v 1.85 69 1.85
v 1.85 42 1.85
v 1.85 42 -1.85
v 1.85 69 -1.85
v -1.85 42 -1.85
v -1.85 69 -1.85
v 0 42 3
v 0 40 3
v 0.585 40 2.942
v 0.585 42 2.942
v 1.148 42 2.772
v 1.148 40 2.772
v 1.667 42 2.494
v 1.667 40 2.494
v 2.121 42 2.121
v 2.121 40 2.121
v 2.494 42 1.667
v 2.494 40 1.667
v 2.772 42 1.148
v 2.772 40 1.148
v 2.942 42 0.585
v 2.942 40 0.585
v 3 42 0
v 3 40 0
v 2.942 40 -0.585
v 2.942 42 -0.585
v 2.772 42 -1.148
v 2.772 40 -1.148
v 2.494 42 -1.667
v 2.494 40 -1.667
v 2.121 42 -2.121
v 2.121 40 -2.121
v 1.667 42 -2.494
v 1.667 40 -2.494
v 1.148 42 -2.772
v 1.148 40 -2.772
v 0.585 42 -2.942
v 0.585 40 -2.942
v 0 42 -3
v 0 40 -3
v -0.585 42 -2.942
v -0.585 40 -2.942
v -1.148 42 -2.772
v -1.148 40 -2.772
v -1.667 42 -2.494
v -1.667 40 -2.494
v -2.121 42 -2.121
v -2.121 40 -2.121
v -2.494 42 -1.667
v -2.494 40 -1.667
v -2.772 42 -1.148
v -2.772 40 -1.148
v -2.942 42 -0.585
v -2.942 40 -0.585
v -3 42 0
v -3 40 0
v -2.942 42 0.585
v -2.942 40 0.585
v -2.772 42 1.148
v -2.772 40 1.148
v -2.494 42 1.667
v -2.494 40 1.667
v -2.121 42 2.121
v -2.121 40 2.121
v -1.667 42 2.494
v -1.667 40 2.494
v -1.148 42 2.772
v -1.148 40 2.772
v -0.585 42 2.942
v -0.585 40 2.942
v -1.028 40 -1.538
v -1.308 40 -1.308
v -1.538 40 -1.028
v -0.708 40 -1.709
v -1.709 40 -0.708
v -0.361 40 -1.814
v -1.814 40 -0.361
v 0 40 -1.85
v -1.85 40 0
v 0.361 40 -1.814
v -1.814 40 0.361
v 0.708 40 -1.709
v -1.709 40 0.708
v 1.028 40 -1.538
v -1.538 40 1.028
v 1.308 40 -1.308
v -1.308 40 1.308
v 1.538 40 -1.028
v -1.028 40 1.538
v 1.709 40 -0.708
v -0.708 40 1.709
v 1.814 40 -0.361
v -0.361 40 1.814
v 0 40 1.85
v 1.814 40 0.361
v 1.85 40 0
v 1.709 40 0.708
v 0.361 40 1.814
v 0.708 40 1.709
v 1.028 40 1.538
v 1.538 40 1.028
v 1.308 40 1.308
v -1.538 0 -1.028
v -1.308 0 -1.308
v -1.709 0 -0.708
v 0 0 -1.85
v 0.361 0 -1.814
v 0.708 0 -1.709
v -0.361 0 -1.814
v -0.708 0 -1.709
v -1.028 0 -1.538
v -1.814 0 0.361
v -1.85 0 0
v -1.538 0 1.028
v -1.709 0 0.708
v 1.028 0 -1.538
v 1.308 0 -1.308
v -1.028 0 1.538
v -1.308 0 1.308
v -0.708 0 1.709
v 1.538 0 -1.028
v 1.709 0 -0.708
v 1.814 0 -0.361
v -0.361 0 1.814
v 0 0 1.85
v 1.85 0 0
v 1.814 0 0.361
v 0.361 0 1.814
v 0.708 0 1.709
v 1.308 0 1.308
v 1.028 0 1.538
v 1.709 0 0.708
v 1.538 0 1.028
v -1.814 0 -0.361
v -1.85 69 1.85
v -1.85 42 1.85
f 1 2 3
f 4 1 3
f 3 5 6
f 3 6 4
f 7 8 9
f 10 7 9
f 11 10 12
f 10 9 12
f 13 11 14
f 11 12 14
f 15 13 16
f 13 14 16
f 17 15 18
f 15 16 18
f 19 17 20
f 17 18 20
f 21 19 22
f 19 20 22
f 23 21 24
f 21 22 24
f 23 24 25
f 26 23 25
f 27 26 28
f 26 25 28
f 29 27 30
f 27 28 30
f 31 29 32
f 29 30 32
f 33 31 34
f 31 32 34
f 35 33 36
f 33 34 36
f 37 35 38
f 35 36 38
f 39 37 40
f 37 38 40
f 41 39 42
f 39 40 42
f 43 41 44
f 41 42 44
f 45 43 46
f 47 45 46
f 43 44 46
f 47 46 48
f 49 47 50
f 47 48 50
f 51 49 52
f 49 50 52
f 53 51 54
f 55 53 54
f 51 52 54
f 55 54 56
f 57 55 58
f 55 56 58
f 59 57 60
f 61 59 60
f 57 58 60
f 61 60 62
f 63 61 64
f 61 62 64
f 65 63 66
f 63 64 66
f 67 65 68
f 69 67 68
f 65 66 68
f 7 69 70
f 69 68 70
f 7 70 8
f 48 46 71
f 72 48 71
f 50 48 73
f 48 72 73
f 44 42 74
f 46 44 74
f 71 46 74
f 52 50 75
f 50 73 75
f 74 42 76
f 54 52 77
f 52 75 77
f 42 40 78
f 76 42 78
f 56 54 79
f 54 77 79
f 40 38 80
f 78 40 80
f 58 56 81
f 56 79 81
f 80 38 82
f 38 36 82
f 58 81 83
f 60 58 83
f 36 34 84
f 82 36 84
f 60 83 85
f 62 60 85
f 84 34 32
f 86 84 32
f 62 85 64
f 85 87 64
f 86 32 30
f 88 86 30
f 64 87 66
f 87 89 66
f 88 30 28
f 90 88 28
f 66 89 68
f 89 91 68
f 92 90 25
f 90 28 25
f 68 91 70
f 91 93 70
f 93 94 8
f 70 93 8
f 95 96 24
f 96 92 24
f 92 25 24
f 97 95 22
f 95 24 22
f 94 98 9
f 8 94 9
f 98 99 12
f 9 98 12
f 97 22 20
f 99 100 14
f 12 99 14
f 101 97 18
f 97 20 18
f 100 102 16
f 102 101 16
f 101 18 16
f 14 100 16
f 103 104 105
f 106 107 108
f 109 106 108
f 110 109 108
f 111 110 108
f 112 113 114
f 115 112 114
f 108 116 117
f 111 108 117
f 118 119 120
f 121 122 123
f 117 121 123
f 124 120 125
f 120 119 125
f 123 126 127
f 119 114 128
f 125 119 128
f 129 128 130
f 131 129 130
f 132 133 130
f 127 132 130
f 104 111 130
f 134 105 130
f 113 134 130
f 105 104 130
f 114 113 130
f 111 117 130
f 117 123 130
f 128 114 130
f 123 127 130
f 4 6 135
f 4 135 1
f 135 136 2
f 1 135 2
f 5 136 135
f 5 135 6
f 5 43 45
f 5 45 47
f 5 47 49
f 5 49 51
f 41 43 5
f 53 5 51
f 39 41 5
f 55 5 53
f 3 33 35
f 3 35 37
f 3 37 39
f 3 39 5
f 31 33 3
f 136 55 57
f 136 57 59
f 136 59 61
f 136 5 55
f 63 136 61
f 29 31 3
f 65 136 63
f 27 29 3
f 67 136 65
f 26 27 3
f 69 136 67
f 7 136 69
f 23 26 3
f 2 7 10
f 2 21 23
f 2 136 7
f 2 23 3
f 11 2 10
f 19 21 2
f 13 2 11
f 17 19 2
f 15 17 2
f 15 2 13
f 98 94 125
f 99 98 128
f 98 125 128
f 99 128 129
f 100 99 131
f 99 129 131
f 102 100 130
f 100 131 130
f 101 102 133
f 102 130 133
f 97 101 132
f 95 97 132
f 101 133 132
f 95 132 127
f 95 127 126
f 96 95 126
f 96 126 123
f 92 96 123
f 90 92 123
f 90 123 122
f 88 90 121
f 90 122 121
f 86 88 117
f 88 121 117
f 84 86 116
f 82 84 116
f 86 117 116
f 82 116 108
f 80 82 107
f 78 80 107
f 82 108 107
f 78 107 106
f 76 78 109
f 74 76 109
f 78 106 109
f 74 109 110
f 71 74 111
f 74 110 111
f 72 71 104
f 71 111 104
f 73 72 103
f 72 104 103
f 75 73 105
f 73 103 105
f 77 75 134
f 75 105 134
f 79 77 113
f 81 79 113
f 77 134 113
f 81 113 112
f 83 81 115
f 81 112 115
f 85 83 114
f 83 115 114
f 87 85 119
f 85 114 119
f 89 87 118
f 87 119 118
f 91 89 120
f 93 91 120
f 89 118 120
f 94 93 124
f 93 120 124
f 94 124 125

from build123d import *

# Parameters (mm, degrees)
SKETCH2_R           = 1.85
BOSS_EXTRUDE1_DEPTH = 40
SKETCH3_R           = 3
BOSS_EXTRUDE2_DEPTH = 2
SKETCH4_W           = 3.7
SKETCH4_H           = 3.7
BOSS_EXTRUDE3_DEPTH = 27


with BuildPart() as part:
    # Sketch2 → Boss-Extrude1 (new body)
    with BuildSketch(Plane(origin=(0, 0, 0), x_dir=(1, 0, 0), z_dir=(0, 1, 0))):
        with Locations(Location((0, 0, 0), (0, 0, 270))):
            Circle(SKETCH2_R)
    extrude(amount=BOSS_EXTRUDE1_DEPTH)

    # Sketch3 → Boss-Extrude2 (add)
    with BuildSketch(Plane(origin=(0, 40, 0), x_dir=(1, 0, 0), z_dir=(0, 1, 0))):
        with Locations(Location((0, 0, 0), (0, 0, 270))):
            Circle(SKETCH3_R)
    extrude(amount=BOSS_EXTRUDE2_DEPTH)

    # Sketch4 → Boss-Extrude3 (add)
    with BuildSketch(Plane(origin=(0, 42, 0), x_dir=(1, 0, 0), z_dir=(0, 1, 0))):
        Rectangle(SKETCH4_W, SKETCH4_H)
    extrude(amount=BOSS_EXTRUDE3_DEPTH)


solid = part.part
